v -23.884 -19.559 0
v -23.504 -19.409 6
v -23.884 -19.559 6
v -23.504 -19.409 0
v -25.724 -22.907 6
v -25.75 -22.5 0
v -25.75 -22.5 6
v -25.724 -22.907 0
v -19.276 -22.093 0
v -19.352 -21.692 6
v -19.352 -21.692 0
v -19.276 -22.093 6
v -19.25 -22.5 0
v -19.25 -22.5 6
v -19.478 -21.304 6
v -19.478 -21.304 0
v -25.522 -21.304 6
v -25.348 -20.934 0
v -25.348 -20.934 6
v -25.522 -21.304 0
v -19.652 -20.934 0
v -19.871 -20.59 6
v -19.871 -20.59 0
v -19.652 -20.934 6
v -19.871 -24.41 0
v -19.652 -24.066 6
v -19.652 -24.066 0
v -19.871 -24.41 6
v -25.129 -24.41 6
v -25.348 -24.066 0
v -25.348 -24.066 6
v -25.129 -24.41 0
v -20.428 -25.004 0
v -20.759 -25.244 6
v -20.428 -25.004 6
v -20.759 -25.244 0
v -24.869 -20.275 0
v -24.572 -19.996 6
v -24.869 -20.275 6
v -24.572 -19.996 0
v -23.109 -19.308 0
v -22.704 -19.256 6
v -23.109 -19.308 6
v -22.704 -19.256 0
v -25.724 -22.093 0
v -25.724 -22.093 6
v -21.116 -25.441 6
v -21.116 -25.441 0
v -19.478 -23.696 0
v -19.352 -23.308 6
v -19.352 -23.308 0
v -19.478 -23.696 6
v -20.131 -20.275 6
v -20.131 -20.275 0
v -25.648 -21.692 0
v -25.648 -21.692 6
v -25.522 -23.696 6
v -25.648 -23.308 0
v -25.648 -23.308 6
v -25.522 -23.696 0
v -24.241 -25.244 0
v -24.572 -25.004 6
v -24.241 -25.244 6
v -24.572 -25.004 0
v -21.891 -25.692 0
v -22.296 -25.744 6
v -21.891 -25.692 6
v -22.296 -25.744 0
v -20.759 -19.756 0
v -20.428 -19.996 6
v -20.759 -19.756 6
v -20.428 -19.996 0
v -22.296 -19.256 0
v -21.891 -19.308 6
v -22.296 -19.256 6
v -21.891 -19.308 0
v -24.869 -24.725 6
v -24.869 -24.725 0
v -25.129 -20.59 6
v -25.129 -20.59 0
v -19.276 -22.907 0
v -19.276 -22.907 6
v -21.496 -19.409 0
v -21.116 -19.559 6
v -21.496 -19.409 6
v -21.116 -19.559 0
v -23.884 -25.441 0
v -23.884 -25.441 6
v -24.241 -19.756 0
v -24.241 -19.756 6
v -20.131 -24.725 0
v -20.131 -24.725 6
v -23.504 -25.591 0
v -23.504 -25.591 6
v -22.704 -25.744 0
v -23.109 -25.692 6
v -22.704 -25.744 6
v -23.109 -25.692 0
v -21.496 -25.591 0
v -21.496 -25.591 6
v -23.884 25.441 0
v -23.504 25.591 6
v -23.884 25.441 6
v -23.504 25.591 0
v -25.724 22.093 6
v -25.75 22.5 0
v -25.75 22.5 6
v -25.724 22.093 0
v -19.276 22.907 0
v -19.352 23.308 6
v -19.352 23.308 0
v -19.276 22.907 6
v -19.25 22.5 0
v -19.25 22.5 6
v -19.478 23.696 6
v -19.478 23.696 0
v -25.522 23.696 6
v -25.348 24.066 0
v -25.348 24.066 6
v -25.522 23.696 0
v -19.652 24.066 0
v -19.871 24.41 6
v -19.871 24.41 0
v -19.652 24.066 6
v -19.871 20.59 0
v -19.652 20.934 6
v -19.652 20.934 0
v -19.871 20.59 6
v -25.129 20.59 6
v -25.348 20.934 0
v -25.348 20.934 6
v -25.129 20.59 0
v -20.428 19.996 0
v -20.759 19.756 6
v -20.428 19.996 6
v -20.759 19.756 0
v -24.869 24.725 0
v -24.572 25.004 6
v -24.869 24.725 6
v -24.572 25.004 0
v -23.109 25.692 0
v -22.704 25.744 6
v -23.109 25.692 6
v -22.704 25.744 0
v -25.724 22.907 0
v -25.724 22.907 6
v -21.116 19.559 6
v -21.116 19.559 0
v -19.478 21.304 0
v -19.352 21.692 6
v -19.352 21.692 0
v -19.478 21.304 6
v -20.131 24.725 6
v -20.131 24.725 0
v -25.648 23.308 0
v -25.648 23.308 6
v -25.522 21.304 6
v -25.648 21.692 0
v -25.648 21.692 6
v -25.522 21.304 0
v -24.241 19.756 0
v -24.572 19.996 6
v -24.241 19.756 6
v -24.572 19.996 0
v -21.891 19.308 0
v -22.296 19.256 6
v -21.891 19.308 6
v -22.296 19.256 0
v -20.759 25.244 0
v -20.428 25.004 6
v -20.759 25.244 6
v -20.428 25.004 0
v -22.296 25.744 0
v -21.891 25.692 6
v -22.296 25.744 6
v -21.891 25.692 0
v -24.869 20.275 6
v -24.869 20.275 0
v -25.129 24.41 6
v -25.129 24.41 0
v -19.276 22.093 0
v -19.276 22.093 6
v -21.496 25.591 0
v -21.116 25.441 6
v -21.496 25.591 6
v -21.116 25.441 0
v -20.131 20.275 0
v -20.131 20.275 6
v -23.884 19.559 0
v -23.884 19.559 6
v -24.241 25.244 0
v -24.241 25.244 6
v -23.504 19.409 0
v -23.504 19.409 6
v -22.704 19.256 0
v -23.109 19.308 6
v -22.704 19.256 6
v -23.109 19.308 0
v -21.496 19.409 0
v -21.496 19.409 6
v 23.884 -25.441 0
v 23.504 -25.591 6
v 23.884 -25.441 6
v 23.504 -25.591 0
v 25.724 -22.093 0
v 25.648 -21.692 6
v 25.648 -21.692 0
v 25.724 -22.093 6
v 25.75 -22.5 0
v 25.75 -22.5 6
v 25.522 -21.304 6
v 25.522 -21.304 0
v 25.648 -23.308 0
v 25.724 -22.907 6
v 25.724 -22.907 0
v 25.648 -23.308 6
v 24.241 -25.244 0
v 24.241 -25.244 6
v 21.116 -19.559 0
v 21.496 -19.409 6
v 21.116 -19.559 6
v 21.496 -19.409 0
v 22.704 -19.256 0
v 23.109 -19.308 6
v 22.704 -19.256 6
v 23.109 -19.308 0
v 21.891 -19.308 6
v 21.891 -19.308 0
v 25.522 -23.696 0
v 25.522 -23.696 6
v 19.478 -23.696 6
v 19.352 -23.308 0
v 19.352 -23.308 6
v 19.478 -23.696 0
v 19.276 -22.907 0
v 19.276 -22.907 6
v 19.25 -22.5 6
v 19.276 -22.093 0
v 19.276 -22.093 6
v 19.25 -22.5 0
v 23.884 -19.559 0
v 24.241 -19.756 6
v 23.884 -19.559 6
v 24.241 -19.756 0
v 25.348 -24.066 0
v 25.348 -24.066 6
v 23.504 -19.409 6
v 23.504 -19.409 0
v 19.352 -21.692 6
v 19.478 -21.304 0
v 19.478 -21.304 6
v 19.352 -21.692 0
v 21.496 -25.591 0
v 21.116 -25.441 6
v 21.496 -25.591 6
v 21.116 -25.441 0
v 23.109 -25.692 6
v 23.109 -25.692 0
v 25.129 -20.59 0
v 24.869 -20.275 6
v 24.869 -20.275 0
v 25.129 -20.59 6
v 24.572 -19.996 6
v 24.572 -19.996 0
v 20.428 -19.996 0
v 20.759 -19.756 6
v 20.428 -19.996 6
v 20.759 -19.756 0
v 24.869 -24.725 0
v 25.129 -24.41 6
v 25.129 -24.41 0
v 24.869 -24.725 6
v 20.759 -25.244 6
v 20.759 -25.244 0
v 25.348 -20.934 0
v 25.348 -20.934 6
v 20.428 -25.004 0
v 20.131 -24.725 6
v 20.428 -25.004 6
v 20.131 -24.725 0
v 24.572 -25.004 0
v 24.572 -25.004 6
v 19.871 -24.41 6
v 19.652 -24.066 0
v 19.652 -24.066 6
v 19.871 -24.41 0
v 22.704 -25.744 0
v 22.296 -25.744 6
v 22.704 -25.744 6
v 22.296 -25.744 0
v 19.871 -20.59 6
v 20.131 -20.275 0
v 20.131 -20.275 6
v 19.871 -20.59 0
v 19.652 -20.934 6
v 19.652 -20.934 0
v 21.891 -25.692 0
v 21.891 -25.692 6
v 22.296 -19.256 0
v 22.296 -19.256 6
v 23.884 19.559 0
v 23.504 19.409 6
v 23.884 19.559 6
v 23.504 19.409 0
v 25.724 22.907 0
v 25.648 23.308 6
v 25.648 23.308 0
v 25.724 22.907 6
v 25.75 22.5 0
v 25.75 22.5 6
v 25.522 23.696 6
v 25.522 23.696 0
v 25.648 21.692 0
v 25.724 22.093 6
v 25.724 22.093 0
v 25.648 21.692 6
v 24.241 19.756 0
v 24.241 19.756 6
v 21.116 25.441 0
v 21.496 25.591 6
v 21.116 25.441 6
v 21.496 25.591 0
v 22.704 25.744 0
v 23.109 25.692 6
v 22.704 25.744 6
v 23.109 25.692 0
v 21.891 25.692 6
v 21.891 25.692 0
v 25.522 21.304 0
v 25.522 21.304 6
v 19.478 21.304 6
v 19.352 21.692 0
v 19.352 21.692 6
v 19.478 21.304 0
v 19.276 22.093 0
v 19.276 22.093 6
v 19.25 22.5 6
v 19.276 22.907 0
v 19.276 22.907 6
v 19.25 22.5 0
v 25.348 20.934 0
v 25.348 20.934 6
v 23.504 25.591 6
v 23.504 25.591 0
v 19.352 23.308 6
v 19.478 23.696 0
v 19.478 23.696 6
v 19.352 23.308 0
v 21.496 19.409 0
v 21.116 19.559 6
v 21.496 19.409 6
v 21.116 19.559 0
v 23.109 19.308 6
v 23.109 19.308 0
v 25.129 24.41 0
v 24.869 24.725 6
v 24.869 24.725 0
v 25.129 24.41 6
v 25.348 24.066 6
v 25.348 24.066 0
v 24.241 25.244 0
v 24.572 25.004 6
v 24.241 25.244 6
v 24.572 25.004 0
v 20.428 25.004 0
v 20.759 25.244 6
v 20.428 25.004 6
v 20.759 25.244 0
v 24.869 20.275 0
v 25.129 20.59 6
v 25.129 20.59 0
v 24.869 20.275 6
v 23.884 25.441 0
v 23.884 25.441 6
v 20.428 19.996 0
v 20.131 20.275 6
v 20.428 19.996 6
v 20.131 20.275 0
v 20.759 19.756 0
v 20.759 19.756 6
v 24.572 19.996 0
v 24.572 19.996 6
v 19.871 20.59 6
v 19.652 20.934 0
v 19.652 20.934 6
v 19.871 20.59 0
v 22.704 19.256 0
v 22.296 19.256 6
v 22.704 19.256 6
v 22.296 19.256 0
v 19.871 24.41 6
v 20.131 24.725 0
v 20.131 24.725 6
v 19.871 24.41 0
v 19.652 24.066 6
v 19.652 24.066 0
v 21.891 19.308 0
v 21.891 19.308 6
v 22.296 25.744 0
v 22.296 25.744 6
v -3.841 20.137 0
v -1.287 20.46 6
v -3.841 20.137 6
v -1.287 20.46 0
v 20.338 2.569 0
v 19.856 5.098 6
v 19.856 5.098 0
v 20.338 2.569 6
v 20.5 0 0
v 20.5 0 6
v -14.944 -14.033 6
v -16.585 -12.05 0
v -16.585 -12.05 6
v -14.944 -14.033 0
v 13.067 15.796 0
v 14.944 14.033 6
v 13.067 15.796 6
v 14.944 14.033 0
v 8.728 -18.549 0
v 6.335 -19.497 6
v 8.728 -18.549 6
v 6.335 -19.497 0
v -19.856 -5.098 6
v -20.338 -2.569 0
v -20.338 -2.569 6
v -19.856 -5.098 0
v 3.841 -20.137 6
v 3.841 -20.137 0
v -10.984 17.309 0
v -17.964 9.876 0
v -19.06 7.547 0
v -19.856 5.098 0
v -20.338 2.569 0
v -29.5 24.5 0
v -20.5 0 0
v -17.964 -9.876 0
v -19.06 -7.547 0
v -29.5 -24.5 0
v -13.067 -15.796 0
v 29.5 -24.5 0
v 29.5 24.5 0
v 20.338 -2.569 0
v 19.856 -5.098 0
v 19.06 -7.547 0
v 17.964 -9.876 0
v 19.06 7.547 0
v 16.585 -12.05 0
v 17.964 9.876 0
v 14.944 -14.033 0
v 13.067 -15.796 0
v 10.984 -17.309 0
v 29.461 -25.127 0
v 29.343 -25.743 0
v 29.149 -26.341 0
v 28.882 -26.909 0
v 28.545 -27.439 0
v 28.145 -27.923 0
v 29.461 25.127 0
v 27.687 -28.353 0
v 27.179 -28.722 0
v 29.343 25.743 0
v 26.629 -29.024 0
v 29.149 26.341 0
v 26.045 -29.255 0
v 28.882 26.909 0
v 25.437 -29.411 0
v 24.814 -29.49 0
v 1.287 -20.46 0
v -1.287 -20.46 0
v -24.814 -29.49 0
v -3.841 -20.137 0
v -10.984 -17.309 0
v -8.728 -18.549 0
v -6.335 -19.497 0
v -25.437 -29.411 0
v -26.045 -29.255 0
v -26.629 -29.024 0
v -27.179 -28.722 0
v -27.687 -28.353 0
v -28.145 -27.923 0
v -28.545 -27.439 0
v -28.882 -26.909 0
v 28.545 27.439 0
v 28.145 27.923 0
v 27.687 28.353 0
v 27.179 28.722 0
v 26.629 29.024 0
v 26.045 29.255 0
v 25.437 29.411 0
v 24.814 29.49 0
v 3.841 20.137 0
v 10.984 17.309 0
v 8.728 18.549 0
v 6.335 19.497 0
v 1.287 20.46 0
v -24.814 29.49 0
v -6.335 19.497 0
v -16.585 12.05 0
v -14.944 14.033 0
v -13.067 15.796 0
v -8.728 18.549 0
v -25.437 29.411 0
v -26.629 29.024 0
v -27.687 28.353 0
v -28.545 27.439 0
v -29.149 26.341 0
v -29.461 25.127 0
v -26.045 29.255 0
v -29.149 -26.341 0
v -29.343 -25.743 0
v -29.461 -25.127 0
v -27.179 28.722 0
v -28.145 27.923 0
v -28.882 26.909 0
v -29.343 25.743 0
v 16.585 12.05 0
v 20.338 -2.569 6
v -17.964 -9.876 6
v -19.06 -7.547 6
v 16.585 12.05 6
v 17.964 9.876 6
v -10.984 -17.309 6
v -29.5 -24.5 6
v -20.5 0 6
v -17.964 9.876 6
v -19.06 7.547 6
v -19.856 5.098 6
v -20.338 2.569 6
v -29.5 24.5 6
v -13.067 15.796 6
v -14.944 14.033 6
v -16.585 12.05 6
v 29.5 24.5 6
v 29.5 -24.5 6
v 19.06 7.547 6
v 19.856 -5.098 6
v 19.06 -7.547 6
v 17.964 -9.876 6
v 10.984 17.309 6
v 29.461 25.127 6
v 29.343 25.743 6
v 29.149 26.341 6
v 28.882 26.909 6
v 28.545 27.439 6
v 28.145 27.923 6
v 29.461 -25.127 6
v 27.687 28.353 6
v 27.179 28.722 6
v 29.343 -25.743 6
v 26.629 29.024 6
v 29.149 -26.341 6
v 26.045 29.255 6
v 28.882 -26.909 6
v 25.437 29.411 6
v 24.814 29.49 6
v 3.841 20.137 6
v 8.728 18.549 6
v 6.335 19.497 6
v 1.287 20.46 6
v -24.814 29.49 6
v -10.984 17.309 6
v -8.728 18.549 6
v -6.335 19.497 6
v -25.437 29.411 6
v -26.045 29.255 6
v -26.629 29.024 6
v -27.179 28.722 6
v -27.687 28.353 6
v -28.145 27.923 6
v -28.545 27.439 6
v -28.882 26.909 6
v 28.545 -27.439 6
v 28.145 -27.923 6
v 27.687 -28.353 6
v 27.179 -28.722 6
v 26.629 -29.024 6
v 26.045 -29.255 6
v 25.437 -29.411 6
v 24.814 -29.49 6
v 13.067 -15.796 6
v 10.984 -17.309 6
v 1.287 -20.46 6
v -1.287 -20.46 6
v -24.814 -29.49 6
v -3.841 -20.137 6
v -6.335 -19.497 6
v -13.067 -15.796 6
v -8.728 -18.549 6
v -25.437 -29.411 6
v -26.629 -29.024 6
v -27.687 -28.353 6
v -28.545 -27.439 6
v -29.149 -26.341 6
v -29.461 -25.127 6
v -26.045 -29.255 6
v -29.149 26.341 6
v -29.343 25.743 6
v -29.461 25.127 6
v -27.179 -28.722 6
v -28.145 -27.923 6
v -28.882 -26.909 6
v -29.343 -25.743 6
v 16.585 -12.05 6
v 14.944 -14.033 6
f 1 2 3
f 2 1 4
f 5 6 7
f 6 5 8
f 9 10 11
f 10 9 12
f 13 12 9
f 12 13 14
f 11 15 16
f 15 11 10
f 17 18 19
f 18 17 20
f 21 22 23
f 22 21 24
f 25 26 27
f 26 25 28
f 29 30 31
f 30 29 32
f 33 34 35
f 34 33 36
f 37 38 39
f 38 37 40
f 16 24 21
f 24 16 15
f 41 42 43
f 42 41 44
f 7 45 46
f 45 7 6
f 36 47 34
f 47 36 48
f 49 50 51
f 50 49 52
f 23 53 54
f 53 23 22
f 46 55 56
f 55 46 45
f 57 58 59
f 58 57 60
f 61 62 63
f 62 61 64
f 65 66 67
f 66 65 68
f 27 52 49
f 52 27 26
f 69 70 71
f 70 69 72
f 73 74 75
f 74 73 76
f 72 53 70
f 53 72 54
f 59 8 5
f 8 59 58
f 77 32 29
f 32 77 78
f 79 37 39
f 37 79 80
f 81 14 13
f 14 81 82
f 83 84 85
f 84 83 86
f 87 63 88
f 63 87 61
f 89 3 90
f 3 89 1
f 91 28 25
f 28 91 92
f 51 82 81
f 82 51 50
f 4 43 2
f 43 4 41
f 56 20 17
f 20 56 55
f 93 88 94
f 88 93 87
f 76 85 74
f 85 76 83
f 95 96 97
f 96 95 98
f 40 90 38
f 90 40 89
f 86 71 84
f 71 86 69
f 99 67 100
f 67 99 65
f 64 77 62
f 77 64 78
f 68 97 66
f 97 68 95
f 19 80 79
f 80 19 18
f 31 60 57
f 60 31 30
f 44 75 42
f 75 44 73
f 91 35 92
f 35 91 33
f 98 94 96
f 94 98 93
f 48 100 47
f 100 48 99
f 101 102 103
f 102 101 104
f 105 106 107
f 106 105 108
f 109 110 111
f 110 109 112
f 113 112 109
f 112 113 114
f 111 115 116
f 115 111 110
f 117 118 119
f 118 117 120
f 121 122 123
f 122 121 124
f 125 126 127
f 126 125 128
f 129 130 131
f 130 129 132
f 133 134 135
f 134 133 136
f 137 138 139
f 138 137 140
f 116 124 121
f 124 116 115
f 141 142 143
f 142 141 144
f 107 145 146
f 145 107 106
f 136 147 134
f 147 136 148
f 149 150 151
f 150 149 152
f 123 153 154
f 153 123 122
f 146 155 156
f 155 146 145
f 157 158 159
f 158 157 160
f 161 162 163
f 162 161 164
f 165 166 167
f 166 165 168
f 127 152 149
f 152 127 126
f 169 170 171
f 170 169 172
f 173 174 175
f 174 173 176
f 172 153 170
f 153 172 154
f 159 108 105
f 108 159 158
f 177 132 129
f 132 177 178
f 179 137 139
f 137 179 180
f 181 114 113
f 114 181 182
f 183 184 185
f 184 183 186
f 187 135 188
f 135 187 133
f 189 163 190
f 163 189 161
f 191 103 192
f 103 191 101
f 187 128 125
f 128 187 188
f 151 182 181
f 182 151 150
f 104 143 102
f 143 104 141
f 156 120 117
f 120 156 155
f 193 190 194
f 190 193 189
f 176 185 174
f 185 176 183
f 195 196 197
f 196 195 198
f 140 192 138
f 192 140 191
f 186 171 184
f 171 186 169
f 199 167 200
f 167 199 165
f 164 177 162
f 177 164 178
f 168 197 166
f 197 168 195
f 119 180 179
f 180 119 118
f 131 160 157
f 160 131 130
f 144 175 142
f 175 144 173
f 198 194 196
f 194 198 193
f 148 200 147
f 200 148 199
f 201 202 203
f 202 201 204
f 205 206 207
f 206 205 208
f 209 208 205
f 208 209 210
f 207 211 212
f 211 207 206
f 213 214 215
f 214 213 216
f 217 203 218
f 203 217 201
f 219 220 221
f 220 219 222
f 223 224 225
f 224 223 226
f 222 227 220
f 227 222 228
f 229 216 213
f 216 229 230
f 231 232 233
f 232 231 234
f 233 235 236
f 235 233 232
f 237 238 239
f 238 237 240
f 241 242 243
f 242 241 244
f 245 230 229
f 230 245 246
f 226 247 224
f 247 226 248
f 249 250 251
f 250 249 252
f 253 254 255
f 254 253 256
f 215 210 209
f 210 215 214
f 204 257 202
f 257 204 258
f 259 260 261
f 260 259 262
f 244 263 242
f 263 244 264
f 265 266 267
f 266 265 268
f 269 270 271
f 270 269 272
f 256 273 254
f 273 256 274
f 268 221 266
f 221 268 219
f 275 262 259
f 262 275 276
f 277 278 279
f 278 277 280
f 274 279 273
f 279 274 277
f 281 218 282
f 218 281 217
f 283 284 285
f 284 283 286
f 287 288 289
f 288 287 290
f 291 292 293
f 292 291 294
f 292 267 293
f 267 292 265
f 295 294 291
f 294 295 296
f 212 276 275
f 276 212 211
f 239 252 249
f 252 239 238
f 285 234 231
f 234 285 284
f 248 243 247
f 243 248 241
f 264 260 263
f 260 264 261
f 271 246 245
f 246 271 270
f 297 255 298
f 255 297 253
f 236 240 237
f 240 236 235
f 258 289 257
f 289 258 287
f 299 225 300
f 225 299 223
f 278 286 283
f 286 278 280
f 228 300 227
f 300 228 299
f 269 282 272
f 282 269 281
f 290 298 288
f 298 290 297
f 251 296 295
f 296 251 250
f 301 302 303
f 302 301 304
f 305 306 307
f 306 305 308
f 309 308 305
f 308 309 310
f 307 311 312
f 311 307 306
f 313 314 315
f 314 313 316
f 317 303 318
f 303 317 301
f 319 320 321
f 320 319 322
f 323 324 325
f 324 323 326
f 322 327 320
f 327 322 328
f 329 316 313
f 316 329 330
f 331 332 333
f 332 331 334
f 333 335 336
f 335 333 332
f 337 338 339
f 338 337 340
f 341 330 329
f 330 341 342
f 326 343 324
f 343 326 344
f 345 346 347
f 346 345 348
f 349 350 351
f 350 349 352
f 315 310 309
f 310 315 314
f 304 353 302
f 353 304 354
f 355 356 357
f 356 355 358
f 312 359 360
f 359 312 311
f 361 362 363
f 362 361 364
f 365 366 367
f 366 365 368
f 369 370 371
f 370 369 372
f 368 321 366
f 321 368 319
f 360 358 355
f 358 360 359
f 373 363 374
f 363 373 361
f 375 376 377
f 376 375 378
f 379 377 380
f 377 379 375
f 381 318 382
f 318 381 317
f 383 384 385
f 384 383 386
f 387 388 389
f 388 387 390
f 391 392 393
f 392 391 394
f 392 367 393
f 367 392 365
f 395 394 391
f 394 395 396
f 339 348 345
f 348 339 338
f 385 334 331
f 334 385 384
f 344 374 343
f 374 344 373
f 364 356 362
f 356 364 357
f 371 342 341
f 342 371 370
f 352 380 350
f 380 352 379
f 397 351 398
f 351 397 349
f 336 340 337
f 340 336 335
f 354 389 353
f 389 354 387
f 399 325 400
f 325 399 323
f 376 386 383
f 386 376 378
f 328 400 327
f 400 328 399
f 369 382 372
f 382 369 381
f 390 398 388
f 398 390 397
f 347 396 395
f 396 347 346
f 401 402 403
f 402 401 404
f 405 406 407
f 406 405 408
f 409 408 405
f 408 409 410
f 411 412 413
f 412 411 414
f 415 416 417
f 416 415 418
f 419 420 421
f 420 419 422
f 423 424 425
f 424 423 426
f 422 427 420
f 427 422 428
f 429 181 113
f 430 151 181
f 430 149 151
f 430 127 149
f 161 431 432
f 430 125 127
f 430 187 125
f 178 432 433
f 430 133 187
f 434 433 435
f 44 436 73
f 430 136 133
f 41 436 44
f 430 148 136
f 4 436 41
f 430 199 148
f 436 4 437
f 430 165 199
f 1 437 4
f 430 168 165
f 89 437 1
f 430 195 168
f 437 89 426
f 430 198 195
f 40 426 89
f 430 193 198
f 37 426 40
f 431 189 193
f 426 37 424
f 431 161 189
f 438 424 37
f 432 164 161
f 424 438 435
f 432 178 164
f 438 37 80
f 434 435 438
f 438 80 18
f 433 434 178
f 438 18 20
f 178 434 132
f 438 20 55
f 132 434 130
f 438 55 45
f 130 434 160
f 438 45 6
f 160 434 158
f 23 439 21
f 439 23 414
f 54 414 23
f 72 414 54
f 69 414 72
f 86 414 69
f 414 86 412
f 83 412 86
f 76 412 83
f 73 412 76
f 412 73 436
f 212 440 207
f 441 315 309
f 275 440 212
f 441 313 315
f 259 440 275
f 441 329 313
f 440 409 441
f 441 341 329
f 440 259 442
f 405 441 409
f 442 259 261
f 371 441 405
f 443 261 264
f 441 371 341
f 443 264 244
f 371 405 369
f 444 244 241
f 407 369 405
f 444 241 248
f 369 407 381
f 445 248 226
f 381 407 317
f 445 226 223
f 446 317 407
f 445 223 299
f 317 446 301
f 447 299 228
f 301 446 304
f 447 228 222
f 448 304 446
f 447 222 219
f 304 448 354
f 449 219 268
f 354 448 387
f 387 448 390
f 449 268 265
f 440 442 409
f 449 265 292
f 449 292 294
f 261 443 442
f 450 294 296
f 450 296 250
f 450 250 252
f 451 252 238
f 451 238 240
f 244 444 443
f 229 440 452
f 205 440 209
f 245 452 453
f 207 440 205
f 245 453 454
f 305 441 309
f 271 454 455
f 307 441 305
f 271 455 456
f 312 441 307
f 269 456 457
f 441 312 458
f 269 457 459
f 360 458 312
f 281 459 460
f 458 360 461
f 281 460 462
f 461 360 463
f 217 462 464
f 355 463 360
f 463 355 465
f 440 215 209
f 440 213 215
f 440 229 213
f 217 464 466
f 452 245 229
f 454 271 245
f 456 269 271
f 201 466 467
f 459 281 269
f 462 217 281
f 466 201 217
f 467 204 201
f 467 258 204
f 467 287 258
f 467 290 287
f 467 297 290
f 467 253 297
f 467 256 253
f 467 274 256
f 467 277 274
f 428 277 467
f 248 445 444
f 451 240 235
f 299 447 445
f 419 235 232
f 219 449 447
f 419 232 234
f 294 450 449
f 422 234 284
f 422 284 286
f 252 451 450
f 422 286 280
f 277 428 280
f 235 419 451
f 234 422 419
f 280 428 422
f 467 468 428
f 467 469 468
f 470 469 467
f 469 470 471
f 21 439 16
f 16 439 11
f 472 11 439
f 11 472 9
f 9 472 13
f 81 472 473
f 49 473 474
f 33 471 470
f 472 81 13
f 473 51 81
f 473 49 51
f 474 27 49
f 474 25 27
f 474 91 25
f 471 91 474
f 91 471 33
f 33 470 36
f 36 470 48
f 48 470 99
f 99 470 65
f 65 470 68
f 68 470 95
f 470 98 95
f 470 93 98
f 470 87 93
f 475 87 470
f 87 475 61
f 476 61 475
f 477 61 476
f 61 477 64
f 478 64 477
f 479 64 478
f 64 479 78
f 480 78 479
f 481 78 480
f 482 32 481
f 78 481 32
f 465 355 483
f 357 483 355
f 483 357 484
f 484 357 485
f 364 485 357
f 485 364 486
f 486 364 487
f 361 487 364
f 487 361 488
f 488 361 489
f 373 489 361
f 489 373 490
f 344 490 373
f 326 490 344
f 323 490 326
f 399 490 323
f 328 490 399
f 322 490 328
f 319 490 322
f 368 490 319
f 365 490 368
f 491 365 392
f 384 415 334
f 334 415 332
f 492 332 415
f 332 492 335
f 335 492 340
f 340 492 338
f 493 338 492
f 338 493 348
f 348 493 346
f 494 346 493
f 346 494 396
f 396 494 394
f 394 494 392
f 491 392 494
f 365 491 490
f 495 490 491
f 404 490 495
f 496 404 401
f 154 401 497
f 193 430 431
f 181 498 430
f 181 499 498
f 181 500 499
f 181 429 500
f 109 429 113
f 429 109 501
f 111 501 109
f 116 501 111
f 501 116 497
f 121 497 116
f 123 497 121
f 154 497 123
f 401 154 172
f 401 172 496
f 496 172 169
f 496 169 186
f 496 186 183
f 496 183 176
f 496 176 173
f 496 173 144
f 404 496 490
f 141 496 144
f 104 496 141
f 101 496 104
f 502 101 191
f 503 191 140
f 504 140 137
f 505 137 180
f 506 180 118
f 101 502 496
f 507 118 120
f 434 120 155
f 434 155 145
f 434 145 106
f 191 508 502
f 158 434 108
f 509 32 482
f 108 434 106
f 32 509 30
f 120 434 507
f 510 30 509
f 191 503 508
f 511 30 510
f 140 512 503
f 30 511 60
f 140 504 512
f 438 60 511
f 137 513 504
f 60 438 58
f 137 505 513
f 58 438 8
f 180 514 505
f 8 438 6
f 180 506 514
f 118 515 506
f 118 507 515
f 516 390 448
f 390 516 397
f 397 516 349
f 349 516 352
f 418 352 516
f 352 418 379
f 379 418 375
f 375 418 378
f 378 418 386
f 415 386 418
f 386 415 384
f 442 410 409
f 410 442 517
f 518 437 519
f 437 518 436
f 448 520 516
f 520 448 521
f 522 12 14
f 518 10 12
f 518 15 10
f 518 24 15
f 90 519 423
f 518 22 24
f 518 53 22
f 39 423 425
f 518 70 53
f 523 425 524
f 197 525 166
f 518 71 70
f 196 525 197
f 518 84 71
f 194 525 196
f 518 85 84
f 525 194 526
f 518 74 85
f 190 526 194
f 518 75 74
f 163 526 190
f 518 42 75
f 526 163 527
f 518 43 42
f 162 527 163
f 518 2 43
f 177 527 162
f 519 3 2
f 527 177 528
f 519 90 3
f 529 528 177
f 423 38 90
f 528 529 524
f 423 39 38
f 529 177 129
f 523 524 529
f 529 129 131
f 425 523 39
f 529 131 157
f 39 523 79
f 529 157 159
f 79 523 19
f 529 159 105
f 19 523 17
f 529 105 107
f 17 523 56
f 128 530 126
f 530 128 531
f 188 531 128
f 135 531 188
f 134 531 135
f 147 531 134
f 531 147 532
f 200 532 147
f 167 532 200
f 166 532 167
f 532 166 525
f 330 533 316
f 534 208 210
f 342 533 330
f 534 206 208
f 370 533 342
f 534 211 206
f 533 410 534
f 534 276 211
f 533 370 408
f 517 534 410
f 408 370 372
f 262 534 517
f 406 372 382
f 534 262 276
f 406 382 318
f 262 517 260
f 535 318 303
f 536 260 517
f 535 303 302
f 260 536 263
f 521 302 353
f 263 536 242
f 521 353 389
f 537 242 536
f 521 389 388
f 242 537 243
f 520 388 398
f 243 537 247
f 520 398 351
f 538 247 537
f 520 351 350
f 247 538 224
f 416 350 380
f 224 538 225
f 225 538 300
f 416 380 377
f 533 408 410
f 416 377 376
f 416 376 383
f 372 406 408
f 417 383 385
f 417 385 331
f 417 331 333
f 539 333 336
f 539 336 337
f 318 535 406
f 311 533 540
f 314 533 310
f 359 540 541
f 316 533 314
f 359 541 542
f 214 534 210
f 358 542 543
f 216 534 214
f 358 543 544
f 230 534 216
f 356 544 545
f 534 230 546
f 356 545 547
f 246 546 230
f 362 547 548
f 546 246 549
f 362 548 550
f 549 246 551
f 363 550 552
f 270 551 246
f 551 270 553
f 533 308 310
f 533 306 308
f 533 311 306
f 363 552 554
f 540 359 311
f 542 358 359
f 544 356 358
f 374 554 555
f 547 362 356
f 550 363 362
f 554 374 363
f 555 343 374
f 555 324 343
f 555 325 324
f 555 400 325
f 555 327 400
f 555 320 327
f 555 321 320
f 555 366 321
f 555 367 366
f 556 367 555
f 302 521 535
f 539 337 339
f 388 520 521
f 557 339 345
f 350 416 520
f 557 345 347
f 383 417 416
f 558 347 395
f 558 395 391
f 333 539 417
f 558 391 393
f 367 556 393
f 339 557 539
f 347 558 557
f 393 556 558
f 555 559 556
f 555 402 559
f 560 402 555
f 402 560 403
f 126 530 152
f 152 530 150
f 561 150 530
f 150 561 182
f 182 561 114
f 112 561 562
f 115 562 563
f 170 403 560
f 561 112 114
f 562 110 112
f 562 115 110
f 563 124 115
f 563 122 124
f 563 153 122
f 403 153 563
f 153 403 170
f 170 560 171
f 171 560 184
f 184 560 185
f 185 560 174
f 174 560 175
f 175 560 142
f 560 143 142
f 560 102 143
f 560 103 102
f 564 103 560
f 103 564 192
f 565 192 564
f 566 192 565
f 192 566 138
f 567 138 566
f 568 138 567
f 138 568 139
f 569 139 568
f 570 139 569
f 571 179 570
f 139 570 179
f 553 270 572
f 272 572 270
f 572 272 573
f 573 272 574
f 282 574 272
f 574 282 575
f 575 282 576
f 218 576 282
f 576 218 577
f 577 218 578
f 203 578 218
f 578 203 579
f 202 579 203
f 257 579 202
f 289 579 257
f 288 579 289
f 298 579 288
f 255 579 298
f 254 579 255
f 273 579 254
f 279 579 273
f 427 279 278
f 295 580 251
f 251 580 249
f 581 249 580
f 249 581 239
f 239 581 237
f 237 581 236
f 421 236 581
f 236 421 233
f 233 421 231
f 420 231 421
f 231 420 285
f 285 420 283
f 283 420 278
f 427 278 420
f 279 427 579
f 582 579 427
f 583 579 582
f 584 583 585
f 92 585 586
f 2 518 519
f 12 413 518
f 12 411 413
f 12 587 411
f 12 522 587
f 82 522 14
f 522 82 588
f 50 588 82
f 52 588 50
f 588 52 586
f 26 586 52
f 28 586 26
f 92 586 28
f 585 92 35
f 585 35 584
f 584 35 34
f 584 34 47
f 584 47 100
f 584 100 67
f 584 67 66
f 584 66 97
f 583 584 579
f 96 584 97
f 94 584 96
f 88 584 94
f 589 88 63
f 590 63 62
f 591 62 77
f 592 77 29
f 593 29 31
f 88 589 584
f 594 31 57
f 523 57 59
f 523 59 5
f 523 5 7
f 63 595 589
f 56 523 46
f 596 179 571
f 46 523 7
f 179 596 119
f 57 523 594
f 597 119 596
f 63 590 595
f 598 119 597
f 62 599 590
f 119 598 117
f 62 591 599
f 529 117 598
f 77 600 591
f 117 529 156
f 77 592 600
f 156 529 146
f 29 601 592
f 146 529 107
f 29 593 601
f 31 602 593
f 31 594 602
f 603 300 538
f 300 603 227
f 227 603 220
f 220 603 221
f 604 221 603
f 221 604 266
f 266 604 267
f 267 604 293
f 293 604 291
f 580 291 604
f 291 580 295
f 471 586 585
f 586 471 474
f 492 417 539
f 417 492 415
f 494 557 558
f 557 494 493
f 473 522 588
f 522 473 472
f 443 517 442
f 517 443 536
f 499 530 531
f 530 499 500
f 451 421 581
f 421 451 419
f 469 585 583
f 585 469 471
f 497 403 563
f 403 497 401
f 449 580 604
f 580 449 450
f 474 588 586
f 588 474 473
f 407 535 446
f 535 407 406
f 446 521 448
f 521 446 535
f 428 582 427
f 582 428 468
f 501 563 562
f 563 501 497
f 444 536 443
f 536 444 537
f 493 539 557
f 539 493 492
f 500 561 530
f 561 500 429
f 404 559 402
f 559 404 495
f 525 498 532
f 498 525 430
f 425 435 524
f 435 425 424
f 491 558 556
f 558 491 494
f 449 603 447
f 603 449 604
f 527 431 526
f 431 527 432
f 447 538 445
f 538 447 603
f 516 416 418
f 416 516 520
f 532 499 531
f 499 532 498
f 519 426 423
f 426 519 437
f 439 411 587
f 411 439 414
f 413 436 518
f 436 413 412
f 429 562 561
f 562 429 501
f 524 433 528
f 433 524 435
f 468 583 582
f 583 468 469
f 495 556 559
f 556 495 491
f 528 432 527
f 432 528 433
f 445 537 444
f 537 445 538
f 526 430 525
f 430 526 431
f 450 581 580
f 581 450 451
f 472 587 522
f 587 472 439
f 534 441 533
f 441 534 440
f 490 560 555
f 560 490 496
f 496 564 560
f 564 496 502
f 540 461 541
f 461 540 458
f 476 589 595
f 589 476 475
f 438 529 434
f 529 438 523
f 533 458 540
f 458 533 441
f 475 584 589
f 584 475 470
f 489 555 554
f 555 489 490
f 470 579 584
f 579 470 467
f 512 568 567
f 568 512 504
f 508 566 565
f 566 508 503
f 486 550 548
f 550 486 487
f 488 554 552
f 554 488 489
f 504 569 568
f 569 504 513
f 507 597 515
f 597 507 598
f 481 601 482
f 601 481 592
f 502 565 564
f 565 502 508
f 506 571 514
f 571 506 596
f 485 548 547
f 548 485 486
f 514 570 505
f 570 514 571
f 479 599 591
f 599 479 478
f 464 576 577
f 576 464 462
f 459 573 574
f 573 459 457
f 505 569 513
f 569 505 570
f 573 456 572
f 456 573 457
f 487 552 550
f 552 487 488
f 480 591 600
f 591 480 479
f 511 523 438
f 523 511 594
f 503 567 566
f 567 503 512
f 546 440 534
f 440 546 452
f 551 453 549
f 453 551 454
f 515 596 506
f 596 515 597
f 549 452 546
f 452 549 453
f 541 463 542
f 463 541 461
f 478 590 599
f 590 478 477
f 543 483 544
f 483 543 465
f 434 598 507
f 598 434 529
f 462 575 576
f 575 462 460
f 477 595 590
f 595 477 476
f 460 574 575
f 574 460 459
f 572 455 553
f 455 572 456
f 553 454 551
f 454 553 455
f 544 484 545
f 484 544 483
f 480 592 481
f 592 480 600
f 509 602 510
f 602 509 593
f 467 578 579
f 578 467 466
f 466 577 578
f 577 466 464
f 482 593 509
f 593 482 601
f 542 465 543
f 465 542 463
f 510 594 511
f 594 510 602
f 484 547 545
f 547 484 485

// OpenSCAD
$fn = 50;

difference() {
	union() {
		hull() {
			translate(v = [-24.5, 24.5, 0]) {
				cylinder(h = 6, r = 5);
			}
			translate(v = [24.5, 24.5, 0]) {
				cylinder(h = 6, r = 5);
			}
			translate(v = [-24.5, -24.5, 0]) {
				cylinder(h = 6, r = 5);
			}
			translate(v = [24.5, -24.5, 0]) {
				cylinder(h = 6, r = 5);
			}
		}
	}
	union() {
		translate(v = [-22.5, -22.5, -100.0]) {
			cylinder(h = 200, r = 3.25);
		}
		translate(v = [-22.5, 22.5, -100.0]) {
			cylinder(h = 200, r = 3.25);
		}
		translate(v = [22.5, -22.5, -100.0]) {
			cylinder(h = 200, r = 3.25);
		}
		translate(v = [22.5, 22.5, -100.0]) {
			cylinder(h = 200, r = 3.25);
		}
		translate(v = [-22.5, -22.5, -100.0]) {
			cylinder(h = 200, r = 1.8);
		}
		translate(v = [-22.5, 22.5, -100.0]) {
			cylinder(h = 200, r = 1.8);
		}
		translate(v = [22.5, -22.5, -100.0]) {
			cylinder(h = 200, r = 1.8);
		}
		translate(v = [22.5, 22.5, -100.0]) {
			cylinder(h = 200, r = 1.8);
		}
		cylinder(h = 6, r = 20.5);
	}
}
